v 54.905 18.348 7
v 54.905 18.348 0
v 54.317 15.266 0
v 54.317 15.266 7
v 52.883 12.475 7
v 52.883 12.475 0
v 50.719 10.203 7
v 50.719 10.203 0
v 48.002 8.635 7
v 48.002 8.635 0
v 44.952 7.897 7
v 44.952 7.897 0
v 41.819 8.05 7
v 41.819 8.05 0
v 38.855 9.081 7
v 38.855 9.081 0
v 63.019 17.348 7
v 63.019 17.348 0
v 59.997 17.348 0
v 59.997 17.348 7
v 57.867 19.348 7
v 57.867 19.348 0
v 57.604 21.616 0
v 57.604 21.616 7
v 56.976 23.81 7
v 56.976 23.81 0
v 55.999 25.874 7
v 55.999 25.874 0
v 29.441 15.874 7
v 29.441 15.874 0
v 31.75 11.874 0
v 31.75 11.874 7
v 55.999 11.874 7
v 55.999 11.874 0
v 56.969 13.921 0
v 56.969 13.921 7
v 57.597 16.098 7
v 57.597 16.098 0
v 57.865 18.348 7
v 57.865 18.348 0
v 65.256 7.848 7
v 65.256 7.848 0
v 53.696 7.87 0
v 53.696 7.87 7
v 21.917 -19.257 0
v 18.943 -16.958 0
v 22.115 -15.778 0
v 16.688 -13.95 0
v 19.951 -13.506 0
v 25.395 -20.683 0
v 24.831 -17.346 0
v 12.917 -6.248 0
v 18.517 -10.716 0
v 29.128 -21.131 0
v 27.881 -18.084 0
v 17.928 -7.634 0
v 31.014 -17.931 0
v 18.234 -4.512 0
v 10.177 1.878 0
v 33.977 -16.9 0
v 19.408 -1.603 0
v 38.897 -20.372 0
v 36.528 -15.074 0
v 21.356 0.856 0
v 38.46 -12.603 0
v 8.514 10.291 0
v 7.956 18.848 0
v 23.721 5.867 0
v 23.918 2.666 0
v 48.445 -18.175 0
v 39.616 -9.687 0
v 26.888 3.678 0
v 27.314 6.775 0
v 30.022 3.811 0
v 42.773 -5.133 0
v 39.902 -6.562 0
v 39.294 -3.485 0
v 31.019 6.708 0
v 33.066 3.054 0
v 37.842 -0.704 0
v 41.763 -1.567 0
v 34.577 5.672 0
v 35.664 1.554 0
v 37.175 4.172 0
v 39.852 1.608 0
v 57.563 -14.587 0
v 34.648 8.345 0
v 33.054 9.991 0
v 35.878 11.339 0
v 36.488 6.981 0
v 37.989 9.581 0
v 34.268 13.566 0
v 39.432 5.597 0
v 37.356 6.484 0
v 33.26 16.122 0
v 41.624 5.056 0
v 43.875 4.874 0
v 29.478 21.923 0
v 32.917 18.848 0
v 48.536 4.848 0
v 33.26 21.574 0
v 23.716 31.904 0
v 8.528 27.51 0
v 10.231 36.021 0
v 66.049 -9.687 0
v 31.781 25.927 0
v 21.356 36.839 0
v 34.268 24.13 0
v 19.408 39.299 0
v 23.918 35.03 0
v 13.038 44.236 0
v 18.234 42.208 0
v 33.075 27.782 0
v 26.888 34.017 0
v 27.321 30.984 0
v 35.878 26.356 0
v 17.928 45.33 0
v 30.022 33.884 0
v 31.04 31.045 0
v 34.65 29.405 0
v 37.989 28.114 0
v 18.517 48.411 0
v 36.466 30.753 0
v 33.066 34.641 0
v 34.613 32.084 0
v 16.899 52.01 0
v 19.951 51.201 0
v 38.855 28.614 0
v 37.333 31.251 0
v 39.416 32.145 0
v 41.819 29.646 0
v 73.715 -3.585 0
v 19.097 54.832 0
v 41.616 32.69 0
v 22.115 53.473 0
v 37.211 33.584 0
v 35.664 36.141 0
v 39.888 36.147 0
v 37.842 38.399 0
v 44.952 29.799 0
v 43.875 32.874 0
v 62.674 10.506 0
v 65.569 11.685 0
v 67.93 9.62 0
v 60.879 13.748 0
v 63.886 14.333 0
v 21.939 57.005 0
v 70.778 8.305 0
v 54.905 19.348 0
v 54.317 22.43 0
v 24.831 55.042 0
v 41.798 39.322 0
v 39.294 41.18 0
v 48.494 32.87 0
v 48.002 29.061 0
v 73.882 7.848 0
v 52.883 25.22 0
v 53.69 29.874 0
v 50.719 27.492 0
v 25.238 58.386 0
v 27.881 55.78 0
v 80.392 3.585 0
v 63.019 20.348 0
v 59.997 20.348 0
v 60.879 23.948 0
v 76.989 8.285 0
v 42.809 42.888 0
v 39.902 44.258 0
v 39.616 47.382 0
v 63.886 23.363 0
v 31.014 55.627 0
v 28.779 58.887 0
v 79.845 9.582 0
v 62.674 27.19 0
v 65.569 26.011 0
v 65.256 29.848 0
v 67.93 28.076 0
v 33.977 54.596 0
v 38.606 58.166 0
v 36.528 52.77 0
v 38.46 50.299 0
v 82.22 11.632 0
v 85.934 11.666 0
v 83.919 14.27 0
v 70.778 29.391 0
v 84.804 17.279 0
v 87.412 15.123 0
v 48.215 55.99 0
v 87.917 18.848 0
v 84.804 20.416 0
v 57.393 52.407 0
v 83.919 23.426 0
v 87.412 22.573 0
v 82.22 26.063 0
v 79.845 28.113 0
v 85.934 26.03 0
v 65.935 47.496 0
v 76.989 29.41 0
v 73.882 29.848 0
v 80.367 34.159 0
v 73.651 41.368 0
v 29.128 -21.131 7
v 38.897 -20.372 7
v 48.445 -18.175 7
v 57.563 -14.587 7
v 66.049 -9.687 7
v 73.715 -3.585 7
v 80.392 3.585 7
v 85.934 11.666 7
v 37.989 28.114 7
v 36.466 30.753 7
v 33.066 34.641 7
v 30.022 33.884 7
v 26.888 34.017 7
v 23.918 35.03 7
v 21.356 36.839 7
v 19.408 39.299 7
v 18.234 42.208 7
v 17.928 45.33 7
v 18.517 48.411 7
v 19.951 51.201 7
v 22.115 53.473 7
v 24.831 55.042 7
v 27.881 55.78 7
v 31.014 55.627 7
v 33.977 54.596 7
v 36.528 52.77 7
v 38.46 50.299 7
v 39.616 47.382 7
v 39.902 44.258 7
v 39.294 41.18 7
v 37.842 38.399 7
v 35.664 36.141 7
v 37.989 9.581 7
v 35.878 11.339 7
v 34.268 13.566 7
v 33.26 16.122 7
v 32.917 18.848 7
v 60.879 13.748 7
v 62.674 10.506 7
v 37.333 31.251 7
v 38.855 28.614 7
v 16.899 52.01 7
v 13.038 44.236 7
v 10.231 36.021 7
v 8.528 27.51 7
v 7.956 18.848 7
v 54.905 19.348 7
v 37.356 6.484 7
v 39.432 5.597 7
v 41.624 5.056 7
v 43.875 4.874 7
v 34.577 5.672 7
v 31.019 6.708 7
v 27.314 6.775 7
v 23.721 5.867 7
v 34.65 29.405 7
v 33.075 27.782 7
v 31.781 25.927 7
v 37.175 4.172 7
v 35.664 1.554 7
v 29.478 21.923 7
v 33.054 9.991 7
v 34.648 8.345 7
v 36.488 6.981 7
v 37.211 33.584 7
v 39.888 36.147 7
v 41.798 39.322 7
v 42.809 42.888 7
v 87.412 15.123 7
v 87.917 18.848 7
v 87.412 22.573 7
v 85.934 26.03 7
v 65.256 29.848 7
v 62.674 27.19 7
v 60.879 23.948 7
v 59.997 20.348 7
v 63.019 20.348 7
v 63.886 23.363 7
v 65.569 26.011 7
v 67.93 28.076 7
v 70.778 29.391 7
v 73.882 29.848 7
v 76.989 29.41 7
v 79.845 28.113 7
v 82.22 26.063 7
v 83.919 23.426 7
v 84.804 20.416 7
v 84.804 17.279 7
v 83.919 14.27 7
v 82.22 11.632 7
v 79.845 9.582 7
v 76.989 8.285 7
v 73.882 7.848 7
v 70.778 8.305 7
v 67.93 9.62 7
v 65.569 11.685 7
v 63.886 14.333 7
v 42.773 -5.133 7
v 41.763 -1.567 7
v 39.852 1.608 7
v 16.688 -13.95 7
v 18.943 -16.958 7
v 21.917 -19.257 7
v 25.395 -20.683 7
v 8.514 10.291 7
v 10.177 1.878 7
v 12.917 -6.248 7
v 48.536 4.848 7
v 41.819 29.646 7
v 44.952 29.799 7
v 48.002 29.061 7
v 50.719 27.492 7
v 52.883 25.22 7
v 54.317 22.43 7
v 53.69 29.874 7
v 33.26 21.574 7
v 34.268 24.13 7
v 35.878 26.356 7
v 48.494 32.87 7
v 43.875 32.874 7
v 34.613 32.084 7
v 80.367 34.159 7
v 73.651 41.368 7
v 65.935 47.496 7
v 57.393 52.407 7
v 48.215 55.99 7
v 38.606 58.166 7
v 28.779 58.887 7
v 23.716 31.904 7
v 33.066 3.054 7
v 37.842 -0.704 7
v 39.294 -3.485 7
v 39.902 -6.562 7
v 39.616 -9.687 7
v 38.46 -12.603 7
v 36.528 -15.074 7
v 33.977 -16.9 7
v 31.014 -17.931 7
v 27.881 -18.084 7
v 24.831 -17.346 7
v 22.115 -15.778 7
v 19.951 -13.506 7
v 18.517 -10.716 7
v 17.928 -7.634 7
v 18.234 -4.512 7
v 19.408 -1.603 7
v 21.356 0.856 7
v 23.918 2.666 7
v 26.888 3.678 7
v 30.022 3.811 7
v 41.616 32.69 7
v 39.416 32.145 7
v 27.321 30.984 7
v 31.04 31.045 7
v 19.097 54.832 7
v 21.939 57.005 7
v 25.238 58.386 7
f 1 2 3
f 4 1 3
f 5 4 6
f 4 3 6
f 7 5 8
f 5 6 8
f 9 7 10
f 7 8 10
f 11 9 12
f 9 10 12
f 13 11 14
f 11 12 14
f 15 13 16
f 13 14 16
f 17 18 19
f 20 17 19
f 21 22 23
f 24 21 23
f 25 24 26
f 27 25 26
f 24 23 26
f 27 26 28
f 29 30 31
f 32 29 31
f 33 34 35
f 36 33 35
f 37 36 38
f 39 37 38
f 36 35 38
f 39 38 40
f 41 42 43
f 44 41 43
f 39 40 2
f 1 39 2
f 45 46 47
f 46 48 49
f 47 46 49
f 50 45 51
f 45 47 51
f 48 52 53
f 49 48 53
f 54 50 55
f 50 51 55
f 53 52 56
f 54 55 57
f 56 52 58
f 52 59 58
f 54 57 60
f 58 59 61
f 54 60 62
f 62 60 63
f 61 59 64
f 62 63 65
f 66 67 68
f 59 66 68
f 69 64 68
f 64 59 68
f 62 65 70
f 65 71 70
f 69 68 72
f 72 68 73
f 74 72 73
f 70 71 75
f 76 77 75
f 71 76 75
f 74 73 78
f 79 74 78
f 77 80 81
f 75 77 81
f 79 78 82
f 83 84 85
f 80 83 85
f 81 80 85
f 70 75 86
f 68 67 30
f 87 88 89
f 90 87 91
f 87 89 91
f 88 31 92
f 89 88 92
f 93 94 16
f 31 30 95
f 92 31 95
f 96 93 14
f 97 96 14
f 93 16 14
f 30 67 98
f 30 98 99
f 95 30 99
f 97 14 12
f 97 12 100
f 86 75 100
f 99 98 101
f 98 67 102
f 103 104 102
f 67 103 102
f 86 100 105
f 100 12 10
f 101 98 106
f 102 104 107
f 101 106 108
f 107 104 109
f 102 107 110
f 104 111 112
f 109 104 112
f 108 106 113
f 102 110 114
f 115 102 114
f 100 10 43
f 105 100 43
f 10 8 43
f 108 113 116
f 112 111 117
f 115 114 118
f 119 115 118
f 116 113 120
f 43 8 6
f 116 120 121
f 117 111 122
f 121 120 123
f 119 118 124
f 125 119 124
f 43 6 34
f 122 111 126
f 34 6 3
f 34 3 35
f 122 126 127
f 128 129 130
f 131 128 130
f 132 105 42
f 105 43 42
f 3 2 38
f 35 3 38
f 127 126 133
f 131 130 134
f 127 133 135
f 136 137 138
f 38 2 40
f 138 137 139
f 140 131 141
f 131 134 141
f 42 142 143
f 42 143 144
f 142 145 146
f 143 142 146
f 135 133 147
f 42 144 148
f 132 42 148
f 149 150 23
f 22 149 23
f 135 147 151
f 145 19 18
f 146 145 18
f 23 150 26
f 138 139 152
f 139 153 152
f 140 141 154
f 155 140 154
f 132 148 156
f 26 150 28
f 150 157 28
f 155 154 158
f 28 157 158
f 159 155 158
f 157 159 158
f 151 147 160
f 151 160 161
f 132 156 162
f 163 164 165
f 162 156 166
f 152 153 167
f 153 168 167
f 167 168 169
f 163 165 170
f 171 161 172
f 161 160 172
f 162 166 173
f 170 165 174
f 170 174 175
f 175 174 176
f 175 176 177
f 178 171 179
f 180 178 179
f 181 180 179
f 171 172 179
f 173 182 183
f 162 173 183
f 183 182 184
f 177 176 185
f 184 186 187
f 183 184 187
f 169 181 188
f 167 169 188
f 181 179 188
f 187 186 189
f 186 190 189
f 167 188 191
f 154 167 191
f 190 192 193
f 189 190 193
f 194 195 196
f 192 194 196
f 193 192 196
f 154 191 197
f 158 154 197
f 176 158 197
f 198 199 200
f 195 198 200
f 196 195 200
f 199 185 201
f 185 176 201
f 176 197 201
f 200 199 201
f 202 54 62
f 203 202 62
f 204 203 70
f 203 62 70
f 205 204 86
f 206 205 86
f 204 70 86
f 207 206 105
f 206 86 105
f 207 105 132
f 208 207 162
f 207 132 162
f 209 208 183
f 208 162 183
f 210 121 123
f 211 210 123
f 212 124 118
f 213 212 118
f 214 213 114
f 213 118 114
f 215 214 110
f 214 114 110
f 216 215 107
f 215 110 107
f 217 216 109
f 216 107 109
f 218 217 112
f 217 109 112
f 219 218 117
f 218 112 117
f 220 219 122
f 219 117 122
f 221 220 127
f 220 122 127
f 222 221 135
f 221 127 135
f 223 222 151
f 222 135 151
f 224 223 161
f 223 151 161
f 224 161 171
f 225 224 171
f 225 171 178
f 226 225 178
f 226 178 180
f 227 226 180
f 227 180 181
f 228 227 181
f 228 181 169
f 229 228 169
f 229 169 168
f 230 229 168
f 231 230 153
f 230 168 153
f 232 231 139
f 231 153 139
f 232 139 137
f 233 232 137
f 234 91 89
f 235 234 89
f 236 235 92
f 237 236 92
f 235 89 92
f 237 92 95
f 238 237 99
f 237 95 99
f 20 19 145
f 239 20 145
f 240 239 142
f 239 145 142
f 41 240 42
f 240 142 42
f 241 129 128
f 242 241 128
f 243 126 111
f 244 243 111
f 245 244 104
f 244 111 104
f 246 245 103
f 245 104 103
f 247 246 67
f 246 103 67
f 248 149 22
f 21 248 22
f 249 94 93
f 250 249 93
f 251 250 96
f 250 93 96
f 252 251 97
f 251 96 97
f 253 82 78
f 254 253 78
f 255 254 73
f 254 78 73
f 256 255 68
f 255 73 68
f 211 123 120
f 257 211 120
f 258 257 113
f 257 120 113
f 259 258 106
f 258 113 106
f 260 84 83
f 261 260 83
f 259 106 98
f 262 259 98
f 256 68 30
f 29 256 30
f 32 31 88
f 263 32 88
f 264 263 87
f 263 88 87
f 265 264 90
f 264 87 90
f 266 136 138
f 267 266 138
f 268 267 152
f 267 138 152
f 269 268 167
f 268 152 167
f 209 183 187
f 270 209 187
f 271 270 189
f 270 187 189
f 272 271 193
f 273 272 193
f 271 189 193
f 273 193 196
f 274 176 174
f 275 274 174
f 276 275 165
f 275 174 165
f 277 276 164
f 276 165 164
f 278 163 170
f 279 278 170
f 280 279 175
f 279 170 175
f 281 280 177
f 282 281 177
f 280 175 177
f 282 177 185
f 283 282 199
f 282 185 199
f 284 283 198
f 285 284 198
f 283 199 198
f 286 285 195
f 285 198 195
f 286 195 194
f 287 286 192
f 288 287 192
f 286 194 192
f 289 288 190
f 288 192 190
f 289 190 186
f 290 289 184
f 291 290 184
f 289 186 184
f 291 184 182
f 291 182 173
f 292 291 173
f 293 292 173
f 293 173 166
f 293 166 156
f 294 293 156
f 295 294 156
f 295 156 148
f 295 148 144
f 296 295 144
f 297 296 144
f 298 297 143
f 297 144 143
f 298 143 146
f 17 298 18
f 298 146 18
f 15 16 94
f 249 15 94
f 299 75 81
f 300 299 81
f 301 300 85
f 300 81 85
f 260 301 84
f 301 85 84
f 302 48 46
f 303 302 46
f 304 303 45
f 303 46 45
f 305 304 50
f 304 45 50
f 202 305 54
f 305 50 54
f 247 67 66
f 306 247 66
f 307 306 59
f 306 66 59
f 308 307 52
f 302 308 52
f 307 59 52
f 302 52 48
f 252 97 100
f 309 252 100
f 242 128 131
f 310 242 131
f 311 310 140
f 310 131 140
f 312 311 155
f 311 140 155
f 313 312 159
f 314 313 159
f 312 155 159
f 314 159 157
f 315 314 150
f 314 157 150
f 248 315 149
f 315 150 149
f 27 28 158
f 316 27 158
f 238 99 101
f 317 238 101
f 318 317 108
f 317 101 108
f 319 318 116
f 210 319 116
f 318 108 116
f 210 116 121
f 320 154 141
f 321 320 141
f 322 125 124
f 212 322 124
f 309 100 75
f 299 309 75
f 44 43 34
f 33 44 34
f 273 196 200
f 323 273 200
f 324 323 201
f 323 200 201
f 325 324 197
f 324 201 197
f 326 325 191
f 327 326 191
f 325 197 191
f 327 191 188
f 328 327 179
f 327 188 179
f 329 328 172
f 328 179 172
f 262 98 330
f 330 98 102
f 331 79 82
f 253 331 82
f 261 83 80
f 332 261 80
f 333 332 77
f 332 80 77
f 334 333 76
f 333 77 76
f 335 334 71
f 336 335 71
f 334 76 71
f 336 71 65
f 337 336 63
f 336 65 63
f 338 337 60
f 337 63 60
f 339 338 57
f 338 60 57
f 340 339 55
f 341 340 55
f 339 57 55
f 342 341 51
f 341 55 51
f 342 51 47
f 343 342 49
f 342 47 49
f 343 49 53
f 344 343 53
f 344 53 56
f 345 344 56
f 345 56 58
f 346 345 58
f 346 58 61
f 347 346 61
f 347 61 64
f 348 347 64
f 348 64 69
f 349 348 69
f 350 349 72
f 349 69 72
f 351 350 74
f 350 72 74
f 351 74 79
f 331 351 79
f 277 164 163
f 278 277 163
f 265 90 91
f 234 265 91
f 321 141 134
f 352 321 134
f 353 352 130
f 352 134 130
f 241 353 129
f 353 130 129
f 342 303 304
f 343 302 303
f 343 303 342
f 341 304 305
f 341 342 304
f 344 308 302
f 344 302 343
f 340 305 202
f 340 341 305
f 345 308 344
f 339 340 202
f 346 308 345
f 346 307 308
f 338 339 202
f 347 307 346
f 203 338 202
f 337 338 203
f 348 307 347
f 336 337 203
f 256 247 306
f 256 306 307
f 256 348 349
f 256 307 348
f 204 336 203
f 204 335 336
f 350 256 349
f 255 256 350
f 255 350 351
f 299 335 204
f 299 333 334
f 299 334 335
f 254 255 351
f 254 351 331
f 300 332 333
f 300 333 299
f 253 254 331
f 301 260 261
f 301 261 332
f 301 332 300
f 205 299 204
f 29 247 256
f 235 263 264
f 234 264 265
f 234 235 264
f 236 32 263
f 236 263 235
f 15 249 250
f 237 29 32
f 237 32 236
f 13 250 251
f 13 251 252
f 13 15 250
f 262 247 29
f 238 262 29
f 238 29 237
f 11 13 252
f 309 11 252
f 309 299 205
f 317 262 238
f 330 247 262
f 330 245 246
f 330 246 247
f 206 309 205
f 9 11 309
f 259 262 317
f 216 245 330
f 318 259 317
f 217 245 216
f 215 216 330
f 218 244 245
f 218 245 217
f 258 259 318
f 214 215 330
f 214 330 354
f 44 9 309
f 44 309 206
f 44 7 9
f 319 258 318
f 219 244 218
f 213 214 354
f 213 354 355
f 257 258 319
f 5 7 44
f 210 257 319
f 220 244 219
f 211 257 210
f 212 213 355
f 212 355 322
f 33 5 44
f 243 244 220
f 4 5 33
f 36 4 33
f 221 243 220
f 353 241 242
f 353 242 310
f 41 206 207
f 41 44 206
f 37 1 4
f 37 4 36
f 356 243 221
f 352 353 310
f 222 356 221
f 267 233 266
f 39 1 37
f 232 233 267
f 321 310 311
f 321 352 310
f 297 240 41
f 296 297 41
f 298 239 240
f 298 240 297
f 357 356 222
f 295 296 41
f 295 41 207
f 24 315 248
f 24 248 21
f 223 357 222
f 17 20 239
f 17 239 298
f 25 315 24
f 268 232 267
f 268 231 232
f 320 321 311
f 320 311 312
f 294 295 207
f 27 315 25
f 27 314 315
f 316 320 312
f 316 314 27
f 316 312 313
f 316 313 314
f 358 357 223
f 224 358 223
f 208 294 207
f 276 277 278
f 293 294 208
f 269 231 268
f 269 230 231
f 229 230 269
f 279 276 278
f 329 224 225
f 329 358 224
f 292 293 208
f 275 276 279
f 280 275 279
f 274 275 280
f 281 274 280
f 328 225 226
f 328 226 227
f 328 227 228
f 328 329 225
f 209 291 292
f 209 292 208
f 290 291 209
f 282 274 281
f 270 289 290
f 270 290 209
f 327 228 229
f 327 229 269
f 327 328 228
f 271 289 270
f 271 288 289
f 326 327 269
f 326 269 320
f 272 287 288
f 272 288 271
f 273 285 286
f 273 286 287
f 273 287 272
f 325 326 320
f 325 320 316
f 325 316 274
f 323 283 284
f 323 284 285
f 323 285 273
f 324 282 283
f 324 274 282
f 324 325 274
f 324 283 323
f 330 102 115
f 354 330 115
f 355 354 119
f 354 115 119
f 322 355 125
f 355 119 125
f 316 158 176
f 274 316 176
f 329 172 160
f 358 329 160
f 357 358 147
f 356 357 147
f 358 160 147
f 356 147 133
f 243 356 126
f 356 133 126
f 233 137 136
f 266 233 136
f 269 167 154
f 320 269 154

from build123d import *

# Parameters (mm, degrees)
F1_DEPTH = 7


with BuildPart() as f1:
    # F0 (on Top) → F1 (new body)
    with BuildSketch(Plane.XY):
        with BuildLine():
            ThreePointArc((16.89919, 52.010391), (10.231369, 36.021395), (7.956455, 18.847793))
            ThreePointArc((7.956455, 18.847793), (10.176788, 1.877889), (16.688307, -13.949545))
            ThreePointArc((16.688307, -13.949545), (21.916728, -19.257324), (29.127611, -21.13138))
            ThreePointArc((29.127611, -21.13138), (61.896865, -12.294717), (85.934267, 11.665958))
            ThreePointArc((85.934267, 11.665958), (87.916728, 18.847793), (85.934267, 26.029629))
            ThreePointArc((85.934267, 26.029629), (61.756138, 50.111193), (28.77906, 58.887066))
            ThreePointArc((28.77906, 58.887066), (21.938501, 57.00461), (16.89919, 52.010391))
        make_face()
        with BuildLine():
            ThreePointArc((32.916728, 18.847793), (34.267878, 24.12981), (37.9894, 28.114226))
            Line((37.9894, 28.114226), (36.465953, 30.752916))
            ThreePointArc((36.465953, 30.752916), (33.829532, 28.625544), (31.781291, 25.927185))
            Line((31.781291, 25.927185), (29.478451, 21.923404))
            Line((29.478451, 21.923404), (23.716056, 31.904166))
            ThreePointArc((23.716056, 31.904166), (29.182603, 30.890033), (34.612802, 32.083573))
            Line((34.612802, 32.083573), (33.066314, 34.641262))
            ThreePointArc((33.066314, 34.641262), (23.416728, 54.354835), (35.66439, 36.141262))
            Line((35.66439, 36.141262), (37.210878, 33.583573))
            ThreePointArc((37.210878, 33.583573), (40.948538, 37.671052), (42.808541, 42.888136))
            Line((42.808541, 42.888136), (48.493562, 32.869938))
            Line((48.493562, 32.869938), (43.874762, 32.873962))
            ThreePointArc((43.874762, 32.873962), (40.504687, 32.462287), (37.332809, 31.251476))
            Line((37.332809, 31.251476), (38.855426, 28.614226))
            ThreePointArc((38.855426, 28.614226), (49.416728, 28.374073), (54.905359, 19.347793))
            Line((54.905359, 19.347793), (57.866741, 19.347793))
            ThreePointArc((57.866741, 19.347793), (57.334459, 22.725785), (55.999117, 25.873962))
            Line((55.999117, 25.873962), (53.689716, 29.873962))
            Line((53.689716, 29.873962), (65.256474, 29.847793))
            ThreePointArc((65.256474, 29.847793), (61.668348, 25.628441), (59.997317, 20.347793))
            Line((59.997317, 20.347793), (63.019481, 20.347793))
            ThreePointArc((63.019481, 20.347793), (84.916728, 18.847793), (63.019481, 17.347793))
            Line((63.019481, 17.347793), (59.997317, 17.347793))
            ThreePointArc((59.997317, 17.347793), (61.668348, 12.067146), (65.256474, 7.847793))
            Line((65.256474, 7.847793), (53.696309, 7.870162))
            Line((53.696309, 7.870162), (55.999117, 11.873962))
            ThreePointArc((55.999117, 11.873962), (57.327231, 14.99697), (57.864871, 18.347793))
            Line((57.864871, 18.347793), (54.905359, 18.347793))
            ThreePointArc((54.905359, 18.347793), (49.416728, 9.321514), (38.855426, 9.08136))
            Line((38.855426, 9.08136), (37.355973, 6.484232))
            ThreePointArc((37.355973, 6.484232), (40.517398, 5.28249), (43.874762, 4.873962))
            Line((43.874762, 4.873962), (48.535531, 4.847793))
            Line((48.535531, 4.847793), (42.773135, -5.132969))
            ThreePointArc((42.773135, -5.132969), (40.913132, 0.084116), (37.175472, 4.171595))
            Line((37.175472, 4.171595), (35.66439, 1.554324))
            ThreePointArc((35.66439, 1.554324), (23.416728, -16.659248), (33.066314, 3.054324))
            Line((33.066314, 3.054324), (34.577396, 5.671595))
            ThreePointArc((34.577396, 5.671595), (29.168705, 6.864763), (23.720576, 5.867031))
            Line((23.720576, 5.867031), (29.441005, 15.873962))
            Line((29.441005, 15.873962), (31.750406, 11.873962))
            ThreePointArc((31.750406, 11.873962), (33.817227, 9.135071), (36.488181, 6.981173))
            Line((36.488181, 6.981173), (37.9894, 9.58136))
            ThreePointArc((37.9894, 9.58136), (34.267878, 13.565777), (32.916728, 18.847793))
        make_face(mode=Mode.SUBTRACT)
    extrude(amount=F1_DEPTH)


solid = f1.part
